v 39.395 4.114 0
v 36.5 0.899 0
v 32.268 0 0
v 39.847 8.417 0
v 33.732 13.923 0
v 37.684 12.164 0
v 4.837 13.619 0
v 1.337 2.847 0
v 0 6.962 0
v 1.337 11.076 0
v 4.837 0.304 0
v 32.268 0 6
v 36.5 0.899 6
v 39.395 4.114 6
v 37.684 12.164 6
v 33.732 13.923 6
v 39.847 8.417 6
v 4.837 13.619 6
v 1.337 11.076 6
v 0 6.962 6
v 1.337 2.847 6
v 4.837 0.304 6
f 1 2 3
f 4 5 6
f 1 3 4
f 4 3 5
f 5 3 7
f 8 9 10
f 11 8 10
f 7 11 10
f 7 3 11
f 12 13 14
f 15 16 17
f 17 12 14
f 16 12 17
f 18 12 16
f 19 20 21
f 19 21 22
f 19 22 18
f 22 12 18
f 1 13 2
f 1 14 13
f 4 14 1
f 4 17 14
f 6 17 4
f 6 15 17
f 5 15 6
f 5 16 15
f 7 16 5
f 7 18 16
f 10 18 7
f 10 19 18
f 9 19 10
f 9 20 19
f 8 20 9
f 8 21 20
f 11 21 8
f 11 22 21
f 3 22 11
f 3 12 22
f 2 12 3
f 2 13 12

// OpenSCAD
$fn = 32;

// ----------------------------------------------------------------------
// Key bar: parallel key, 6 mm thick
// ----------------------------------------------------------------------

// --- parameters (mm) ---
profile_height = 6;       // extrusion height
profile_points = 11;      // points of the closed outline

profile = [[0, 6.962], [1.337, 2.847], [4.837, 0.304], [32.268, 0], [36.5, 0.899], [39.395, 4.114], [39.847, 8.417], [37.684, 12.164], [33.732, 13.923], [4.837, 13.619], [1.337, 11.076]];  // single closed polygon, 11 points, counter clockwise

// --- the one profile operation ---
linear_extrude(height = profile_height) polygon(points = profile);
